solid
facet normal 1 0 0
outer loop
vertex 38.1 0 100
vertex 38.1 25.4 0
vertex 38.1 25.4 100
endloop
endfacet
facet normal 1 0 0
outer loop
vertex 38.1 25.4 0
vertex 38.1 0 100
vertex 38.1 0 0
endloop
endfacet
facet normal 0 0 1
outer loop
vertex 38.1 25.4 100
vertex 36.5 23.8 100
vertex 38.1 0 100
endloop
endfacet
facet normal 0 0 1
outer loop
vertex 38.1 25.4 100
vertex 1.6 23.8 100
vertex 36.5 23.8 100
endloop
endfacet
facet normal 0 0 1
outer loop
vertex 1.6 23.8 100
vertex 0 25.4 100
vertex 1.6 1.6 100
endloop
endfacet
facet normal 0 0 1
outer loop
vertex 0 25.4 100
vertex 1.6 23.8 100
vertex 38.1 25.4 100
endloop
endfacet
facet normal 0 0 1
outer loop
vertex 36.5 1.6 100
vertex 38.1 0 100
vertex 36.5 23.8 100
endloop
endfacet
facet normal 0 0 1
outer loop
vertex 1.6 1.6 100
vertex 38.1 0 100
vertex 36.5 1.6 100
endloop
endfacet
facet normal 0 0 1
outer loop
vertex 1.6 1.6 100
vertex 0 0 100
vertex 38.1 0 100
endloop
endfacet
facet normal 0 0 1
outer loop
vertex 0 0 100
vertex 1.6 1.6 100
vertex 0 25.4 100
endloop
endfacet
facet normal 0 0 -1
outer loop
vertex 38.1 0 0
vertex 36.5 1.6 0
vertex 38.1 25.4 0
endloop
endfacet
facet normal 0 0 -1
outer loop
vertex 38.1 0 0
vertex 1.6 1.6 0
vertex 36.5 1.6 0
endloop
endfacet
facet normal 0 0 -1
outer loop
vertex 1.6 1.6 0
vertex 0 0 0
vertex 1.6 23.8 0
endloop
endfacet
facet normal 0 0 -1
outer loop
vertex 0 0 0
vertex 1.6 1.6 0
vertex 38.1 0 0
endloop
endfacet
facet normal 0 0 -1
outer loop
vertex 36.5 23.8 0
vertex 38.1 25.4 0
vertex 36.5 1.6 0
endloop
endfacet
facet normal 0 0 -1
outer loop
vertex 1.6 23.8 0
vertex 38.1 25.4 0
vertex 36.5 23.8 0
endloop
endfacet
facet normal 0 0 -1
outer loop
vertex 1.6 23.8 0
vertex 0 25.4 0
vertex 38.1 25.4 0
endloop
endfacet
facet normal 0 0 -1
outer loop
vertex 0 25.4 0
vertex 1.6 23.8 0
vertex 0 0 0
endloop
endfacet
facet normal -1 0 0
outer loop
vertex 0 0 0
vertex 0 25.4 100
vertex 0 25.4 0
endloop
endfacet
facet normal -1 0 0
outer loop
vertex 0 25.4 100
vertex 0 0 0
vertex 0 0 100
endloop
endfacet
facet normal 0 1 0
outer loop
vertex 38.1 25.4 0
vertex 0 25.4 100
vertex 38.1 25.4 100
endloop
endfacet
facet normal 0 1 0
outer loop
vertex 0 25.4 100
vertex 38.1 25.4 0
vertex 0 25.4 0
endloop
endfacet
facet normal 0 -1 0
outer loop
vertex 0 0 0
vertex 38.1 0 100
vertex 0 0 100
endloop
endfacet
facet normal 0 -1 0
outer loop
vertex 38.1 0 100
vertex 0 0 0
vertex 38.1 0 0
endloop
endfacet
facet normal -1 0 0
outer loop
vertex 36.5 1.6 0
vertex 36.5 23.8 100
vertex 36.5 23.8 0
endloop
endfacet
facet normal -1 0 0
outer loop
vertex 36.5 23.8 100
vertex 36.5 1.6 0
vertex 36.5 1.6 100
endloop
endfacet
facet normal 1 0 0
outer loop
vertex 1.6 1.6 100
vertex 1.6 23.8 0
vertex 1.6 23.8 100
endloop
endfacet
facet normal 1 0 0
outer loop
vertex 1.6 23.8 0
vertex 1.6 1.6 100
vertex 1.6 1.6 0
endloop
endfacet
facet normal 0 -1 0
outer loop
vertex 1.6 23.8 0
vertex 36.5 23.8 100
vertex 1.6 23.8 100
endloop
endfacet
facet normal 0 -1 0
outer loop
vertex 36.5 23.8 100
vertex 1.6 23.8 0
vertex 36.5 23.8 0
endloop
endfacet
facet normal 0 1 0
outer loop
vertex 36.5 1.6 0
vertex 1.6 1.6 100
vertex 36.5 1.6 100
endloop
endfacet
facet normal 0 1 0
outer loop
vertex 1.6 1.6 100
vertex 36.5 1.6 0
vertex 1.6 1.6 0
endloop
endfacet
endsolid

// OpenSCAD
$fn = 64;

outer_w = 38.1;   // mm
outer_h = 25.4;   // mm
wall    = 1.6;    // mm
length  = 100;    // mm (extrusion length)

inner_w = outer_w - 2*wall;
inner_h = outer_h - 2*wall;

difference() {
    cube([outer_w, outer_h, length], center=false);
    translate([wall, wall, -0.1])
        cube([inner_w, inner_h, length + 0.2], center=false);
}
